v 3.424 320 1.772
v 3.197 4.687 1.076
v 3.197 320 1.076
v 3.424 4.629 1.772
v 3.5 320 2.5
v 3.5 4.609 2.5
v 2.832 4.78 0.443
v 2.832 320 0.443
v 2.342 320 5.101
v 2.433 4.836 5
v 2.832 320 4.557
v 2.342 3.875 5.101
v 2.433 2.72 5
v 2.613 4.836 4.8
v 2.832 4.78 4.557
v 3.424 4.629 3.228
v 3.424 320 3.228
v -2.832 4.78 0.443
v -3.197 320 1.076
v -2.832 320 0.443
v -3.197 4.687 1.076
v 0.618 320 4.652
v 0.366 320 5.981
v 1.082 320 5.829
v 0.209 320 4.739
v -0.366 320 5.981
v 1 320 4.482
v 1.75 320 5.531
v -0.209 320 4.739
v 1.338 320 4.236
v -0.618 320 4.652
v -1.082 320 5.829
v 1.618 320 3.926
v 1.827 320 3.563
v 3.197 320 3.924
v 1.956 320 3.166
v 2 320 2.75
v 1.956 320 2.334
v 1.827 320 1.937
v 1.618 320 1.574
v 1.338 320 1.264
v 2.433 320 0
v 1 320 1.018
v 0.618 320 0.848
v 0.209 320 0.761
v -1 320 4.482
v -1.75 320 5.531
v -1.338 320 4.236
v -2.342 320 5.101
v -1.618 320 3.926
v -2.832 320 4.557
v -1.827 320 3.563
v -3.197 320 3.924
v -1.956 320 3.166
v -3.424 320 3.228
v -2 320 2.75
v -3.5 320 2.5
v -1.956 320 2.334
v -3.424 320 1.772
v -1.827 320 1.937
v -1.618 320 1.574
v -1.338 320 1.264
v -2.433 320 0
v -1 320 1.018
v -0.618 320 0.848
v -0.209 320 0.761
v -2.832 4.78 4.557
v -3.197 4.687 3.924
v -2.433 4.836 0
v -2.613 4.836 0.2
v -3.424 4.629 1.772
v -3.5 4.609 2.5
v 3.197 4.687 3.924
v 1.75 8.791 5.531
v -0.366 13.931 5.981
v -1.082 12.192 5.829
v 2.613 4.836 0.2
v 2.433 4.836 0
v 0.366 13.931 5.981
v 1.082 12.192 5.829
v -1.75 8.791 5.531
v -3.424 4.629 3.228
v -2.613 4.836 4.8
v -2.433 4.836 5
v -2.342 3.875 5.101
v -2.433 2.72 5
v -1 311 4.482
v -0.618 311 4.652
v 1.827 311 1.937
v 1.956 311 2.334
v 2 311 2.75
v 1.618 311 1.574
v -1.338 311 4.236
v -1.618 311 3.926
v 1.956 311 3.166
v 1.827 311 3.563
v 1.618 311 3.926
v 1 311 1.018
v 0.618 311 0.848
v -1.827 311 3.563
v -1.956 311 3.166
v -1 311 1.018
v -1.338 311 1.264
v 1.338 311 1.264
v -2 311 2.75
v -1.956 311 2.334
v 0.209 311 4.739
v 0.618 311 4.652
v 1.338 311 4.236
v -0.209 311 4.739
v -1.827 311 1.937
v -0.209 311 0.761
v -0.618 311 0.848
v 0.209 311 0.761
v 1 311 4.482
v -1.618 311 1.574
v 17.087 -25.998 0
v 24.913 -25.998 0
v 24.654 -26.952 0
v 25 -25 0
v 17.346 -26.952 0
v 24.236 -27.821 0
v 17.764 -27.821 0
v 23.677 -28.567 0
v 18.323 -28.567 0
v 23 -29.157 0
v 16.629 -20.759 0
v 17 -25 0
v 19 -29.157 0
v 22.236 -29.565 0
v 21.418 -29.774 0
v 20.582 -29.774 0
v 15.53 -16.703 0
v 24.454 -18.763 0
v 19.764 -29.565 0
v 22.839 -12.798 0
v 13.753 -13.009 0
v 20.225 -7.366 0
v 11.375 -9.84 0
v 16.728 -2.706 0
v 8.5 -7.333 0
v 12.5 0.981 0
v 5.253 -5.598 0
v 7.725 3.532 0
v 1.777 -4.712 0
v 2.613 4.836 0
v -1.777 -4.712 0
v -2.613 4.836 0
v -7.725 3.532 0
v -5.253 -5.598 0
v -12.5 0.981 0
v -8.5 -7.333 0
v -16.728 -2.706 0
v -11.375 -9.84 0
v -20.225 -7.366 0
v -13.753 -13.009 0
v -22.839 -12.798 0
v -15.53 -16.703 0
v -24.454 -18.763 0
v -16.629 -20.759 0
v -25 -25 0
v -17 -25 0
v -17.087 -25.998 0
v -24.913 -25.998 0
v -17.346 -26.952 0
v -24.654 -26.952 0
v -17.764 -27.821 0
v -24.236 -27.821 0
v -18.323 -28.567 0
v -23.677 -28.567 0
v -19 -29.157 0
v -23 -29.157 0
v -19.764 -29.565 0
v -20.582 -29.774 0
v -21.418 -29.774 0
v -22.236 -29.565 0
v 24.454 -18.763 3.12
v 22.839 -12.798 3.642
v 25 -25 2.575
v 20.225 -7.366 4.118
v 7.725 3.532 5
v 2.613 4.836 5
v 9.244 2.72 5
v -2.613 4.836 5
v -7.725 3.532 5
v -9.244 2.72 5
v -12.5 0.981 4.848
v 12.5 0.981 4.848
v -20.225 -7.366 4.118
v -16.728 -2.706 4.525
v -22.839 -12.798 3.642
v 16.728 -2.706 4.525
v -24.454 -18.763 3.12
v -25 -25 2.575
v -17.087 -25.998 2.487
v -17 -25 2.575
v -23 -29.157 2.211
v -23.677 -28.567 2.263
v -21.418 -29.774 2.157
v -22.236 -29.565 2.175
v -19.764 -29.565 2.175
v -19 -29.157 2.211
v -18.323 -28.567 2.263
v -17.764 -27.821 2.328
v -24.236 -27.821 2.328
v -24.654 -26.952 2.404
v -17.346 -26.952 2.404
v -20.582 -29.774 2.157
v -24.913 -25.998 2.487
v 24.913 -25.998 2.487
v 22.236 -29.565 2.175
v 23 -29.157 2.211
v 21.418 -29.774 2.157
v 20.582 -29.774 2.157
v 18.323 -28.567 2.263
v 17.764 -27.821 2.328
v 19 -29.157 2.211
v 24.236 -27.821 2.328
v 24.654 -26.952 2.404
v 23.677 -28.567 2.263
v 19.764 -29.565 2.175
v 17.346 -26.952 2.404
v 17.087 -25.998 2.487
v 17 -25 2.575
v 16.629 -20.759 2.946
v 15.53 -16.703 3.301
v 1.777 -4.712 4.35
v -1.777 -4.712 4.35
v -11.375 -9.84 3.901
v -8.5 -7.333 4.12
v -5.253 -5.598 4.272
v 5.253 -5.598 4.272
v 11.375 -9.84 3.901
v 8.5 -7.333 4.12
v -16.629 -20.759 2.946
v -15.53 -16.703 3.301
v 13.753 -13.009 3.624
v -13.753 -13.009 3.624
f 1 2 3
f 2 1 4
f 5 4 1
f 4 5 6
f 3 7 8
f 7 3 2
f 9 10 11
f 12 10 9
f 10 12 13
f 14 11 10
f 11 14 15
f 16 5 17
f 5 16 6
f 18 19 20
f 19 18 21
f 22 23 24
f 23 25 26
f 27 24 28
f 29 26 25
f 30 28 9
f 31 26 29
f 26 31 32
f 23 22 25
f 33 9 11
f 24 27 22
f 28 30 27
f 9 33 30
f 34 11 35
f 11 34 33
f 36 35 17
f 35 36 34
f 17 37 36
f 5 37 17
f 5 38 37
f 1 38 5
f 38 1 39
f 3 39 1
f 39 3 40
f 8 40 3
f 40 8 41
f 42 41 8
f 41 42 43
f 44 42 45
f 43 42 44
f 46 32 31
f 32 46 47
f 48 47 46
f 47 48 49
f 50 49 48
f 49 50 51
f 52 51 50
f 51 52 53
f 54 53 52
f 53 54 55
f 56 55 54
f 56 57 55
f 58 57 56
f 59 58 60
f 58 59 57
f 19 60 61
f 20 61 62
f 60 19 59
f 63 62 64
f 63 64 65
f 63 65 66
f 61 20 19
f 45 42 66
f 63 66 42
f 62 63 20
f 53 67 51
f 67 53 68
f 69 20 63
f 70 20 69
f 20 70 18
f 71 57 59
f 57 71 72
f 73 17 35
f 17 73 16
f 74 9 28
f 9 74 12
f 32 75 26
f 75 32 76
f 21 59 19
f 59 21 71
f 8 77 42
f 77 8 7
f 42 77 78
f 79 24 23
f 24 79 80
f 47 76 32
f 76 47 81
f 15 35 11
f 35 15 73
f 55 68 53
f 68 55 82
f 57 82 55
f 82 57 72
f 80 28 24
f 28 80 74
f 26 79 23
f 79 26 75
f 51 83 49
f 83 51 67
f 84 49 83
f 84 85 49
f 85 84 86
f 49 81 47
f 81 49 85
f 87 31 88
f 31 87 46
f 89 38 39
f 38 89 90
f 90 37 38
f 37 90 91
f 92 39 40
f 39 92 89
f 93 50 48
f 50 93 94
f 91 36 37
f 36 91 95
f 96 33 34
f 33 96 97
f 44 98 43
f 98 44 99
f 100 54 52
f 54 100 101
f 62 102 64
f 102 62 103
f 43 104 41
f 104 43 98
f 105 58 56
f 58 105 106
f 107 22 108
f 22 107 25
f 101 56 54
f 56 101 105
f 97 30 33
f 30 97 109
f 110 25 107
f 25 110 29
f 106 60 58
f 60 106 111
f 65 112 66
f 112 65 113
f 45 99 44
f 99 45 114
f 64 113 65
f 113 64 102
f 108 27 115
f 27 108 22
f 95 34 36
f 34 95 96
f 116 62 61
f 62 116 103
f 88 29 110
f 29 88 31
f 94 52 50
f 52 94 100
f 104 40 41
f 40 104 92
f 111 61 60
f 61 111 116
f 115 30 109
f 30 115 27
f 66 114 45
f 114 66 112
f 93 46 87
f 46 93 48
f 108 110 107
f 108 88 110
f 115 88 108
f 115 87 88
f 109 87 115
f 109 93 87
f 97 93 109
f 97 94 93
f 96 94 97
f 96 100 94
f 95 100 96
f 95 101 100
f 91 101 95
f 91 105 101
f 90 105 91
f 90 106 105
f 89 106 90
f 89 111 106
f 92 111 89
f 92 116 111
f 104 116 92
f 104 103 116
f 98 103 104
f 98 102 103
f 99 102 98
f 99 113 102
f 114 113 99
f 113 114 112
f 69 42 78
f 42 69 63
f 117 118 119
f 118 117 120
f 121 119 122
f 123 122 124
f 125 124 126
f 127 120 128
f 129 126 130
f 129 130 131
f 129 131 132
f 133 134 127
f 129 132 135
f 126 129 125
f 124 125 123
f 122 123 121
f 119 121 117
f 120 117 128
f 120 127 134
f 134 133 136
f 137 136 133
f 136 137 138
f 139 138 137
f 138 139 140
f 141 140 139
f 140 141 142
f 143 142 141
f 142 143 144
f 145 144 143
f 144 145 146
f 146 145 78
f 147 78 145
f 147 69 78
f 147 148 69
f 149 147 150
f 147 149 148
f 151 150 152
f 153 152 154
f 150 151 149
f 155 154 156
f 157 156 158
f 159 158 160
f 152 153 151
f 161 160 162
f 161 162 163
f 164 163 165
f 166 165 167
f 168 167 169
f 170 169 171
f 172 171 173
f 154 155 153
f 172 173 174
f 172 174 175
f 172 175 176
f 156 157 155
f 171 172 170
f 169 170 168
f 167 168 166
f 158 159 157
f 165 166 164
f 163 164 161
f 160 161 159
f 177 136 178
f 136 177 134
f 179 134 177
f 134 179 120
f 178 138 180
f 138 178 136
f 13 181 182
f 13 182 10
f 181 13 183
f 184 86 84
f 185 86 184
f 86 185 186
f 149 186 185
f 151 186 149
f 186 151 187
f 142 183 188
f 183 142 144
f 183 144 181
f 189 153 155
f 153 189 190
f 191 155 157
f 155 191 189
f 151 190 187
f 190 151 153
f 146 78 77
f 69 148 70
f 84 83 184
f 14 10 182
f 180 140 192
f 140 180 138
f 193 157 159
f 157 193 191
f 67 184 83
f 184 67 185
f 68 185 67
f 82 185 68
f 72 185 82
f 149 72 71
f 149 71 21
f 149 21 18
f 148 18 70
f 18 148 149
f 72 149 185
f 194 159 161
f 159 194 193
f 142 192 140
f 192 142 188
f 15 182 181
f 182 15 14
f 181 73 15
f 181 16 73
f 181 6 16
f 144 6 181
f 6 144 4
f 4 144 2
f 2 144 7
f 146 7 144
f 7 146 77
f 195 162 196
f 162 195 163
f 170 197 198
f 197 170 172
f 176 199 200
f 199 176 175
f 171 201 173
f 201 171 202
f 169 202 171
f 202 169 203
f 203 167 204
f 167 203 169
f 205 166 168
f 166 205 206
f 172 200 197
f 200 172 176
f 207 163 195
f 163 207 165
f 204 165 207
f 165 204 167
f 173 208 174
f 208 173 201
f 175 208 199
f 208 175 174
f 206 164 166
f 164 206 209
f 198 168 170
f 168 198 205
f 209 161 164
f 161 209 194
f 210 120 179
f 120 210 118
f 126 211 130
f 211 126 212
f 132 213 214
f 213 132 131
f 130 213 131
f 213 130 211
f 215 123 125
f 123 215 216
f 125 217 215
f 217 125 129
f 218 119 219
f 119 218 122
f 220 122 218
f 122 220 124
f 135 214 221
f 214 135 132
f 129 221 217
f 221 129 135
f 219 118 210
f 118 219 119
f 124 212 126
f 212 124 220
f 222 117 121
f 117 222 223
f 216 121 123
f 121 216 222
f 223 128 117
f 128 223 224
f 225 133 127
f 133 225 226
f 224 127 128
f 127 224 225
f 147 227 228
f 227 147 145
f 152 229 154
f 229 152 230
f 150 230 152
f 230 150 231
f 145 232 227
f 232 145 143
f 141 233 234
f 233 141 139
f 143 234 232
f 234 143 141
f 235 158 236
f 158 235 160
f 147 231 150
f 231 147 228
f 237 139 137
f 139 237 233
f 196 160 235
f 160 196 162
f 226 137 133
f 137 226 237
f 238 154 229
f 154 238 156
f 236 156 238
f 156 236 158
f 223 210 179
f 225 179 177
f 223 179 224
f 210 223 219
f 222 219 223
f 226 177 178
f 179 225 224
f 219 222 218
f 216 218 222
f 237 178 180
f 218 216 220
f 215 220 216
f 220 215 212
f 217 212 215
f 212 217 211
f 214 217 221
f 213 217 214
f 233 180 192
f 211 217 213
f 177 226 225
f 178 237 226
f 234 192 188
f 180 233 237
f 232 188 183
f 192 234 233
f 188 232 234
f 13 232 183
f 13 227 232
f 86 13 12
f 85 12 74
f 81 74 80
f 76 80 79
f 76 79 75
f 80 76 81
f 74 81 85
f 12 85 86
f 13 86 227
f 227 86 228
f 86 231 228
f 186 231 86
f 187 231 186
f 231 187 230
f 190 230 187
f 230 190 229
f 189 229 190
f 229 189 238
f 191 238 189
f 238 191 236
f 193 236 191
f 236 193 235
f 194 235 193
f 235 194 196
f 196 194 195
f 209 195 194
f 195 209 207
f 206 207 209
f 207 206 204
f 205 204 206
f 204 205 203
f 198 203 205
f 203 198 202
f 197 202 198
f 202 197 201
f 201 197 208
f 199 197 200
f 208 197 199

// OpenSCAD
// Mouthstick Length
length = 320; // [10:350]
// Surface Smoothing
smooth = 30;  // [30:100]
// Bite Plate Size
bite_plate =50;	//	[25:small, 32:medium, 40:large, 50:supersized]


$fn = smooth;
difference()
{
union()
{
// stylus
rotate([-90,0,0]) 
{
difference()
{
translate([0,-2.5,0])
cylinder (length, 3.5, 3.5, false);

// hole in end for foam
translate([0,-2.75,length-9])
cylinder (h=9, r1=2, r2=2);


// flat bottom on stylus
translate([-3.5,0,0])
cube ([7, 7, length]);
}
}




// mouthpeice
translate([0,-bite_plate/2,0])
scale ([bite_plate/2,(bite_plate/2)*1.2,1])
{
difference()
{
union()
{
difference()
{
cylinder (h=5, r1=1, r2=1, center=false);
translate ([0,-1,2.5])
cube ([2,2,5], center=true);
}

//rounded bite plate ends
translate ([-.84,0,0])
cylinder (h=5,r1=.16,r2=.16, center=false);

translate ([.84,0,0])
cylinder (h=5,r1=.16,r2=.16, center=false);
}
// inner mouthpeice hole
cylinder (h=5,r1=.68, r2=.68);
}
}
}
translate ([-bite_plate/2,-bite_plate+7, 1])
rotate ([5,0,0])
cube ([bite_plate, bite_plate*2, 30]);
}
